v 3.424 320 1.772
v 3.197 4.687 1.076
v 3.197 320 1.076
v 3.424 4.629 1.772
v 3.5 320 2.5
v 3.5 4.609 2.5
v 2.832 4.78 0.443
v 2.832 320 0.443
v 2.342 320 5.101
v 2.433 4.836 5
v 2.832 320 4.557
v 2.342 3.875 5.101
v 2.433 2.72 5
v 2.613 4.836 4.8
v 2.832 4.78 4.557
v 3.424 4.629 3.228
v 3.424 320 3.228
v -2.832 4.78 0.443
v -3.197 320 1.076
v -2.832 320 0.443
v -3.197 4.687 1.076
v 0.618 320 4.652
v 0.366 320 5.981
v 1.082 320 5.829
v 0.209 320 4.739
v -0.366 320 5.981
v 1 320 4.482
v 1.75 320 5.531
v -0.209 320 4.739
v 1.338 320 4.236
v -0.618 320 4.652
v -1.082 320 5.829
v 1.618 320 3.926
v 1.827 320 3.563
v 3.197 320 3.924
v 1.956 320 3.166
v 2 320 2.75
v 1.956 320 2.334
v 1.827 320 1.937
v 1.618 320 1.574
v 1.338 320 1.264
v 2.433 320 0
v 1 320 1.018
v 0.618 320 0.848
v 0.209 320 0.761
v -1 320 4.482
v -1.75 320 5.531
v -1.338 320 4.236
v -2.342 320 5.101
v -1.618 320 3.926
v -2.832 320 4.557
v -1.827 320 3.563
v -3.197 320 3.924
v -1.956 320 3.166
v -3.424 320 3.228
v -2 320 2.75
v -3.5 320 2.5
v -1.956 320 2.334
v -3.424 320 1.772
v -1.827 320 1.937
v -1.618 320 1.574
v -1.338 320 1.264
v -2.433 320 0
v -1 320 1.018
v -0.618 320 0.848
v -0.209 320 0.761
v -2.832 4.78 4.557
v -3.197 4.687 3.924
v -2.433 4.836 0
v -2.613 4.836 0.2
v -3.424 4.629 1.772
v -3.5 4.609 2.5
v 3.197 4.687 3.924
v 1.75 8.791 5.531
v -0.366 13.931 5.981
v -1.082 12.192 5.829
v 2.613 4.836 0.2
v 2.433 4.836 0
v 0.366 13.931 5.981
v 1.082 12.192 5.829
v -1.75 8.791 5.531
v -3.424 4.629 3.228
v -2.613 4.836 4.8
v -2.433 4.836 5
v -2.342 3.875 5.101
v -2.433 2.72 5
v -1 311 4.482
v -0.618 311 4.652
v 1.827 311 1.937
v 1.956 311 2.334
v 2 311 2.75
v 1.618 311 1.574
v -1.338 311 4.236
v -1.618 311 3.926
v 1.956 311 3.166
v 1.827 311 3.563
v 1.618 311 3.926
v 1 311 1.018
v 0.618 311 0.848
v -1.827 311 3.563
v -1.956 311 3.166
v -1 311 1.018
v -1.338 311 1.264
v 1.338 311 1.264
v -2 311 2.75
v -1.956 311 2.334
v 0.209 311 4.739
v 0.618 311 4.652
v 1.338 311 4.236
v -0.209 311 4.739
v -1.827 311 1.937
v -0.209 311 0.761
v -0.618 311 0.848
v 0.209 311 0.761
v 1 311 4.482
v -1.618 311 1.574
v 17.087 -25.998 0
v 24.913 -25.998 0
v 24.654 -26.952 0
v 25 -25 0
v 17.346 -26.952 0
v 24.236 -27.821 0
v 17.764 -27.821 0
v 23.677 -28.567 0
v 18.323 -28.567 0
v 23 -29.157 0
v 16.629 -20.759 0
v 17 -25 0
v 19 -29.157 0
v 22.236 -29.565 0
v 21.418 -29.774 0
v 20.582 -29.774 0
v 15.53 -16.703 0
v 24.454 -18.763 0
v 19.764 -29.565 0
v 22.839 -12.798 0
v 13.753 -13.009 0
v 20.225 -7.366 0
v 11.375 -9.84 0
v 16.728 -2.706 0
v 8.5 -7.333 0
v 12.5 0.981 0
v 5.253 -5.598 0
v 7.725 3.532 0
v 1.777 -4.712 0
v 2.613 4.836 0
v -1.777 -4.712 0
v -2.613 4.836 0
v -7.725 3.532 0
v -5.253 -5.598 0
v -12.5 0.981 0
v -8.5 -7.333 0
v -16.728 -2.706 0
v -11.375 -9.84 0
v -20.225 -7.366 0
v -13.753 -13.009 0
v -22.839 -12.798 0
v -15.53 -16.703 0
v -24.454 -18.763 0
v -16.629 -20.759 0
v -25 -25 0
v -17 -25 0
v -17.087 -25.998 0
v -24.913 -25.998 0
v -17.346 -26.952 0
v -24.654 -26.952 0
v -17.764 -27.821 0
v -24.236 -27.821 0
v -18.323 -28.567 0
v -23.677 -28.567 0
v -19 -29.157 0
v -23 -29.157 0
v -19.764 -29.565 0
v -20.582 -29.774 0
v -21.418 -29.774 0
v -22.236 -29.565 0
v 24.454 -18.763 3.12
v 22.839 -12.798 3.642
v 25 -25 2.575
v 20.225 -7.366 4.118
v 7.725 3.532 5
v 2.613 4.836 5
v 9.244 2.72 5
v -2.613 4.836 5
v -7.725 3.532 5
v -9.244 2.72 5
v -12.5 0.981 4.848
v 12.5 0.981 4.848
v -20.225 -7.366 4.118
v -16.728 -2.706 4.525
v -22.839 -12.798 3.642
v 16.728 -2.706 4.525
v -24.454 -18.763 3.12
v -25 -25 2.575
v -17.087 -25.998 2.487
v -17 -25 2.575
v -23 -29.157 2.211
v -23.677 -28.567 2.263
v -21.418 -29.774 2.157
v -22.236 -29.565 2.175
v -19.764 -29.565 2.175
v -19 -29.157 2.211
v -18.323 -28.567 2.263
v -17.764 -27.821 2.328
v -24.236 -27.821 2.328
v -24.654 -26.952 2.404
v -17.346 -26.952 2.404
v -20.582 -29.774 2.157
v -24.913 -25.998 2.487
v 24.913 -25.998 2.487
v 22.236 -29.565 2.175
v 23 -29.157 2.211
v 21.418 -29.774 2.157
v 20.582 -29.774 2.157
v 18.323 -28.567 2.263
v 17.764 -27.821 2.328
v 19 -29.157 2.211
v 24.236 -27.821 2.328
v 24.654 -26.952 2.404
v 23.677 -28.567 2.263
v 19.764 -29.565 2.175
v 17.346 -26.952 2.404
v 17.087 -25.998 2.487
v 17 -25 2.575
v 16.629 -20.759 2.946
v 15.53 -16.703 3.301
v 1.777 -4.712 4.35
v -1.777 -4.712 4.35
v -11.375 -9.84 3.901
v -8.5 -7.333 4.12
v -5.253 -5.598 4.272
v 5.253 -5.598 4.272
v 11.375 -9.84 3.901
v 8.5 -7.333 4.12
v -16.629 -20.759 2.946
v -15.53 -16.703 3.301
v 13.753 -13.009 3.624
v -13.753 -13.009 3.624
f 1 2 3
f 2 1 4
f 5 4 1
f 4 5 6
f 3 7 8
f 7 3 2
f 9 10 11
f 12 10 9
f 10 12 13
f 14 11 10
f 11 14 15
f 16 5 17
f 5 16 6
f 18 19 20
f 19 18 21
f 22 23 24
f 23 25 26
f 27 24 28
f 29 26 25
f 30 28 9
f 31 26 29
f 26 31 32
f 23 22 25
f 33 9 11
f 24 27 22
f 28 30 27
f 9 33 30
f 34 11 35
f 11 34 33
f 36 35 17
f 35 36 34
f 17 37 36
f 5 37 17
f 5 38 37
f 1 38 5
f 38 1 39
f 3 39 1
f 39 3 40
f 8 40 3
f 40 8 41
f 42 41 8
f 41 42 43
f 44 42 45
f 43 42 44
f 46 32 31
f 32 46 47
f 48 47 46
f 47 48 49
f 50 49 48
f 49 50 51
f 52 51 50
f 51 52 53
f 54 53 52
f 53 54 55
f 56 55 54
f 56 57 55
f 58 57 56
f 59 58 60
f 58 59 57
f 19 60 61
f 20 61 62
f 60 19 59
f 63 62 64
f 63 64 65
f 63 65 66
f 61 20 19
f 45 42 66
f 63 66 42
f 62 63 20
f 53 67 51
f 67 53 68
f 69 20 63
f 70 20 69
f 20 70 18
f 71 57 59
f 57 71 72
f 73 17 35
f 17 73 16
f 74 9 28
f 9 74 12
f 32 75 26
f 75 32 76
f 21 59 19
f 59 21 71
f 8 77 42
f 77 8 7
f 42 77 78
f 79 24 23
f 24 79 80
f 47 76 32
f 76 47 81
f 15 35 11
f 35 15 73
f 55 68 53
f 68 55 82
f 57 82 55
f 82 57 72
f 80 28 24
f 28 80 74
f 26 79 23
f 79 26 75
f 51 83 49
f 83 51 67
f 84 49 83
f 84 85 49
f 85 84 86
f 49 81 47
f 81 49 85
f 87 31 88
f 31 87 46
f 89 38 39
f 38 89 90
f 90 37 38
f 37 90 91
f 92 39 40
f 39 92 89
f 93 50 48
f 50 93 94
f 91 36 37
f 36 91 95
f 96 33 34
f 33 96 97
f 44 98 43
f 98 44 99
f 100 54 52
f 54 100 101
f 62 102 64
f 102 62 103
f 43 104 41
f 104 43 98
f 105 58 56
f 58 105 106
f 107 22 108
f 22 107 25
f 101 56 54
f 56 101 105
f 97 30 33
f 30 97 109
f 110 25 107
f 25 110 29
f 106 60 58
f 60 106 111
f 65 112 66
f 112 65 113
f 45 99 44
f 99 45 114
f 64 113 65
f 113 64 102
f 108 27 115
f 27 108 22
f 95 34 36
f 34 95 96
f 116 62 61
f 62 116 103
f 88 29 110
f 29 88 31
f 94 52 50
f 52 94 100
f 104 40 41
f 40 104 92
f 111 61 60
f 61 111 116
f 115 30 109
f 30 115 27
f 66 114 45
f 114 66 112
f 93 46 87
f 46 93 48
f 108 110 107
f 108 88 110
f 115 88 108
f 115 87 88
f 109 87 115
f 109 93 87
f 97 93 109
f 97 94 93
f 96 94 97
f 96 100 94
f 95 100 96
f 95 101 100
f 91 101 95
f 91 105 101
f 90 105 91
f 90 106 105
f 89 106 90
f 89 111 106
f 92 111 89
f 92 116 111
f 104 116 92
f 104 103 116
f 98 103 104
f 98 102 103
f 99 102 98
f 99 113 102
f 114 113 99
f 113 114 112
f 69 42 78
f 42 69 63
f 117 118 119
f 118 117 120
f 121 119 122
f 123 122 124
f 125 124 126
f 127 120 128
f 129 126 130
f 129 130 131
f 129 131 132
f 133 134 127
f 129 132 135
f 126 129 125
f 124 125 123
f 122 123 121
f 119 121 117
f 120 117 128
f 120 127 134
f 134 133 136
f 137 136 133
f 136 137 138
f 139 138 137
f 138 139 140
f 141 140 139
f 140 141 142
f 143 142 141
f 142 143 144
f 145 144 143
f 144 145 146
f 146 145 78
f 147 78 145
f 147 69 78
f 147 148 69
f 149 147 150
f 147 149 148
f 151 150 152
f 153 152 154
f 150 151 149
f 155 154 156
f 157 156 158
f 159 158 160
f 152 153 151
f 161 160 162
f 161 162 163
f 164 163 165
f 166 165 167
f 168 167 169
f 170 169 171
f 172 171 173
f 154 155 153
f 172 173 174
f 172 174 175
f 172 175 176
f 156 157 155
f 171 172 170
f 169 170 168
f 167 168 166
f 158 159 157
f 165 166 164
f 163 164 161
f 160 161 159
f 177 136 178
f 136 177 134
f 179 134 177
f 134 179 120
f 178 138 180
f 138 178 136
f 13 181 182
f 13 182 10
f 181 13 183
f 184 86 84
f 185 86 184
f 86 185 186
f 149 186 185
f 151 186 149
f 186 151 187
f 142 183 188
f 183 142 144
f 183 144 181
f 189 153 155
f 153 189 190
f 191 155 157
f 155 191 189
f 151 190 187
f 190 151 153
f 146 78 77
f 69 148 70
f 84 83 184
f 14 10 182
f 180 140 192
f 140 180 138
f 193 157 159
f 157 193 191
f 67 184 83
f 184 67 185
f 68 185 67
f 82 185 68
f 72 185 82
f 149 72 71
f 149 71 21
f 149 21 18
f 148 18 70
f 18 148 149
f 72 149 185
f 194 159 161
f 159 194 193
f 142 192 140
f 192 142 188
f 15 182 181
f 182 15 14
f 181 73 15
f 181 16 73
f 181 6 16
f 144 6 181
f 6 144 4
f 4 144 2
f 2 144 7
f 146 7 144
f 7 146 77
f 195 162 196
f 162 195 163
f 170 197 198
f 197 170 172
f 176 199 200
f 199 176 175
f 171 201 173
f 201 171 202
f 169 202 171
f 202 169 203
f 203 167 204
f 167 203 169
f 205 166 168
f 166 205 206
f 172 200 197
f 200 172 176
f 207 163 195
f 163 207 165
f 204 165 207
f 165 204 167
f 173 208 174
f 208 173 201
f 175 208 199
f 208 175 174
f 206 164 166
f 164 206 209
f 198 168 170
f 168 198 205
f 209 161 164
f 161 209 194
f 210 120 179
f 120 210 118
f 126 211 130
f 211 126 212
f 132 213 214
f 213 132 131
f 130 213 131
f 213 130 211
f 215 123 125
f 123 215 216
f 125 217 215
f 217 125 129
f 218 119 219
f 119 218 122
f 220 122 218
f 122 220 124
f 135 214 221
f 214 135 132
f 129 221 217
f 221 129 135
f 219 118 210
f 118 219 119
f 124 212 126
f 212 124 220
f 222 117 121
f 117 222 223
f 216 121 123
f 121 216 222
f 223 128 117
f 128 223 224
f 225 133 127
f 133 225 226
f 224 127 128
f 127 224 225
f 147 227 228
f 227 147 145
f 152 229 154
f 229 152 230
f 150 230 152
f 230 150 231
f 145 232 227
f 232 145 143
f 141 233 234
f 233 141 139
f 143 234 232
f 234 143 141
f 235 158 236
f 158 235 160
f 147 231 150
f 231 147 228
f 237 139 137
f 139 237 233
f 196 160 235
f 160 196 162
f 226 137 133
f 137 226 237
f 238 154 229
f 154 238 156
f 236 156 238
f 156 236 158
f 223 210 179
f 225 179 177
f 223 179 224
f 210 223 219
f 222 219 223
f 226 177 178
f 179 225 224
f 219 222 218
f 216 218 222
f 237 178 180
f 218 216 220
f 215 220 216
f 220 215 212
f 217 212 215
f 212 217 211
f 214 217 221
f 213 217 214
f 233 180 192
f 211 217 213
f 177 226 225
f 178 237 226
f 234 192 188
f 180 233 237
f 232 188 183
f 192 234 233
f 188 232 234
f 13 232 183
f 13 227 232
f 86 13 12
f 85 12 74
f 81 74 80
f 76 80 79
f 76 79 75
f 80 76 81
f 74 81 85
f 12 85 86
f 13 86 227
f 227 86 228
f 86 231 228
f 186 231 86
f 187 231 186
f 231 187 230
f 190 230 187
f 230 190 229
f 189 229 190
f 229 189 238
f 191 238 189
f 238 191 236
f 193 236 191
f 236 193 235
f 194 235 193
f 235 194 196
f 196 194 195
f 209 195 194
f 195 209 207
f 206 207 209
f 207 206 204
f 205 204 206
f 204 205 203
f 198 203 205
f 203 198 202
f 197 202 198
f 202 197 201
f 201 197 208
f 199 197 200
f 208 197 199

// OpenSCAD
// Mouthstick Length
length = 320; // [10:350]
// Surface Smoothing
smooth = 30;  // [30:100]
// Bite Plate Size
bite_plate =50;	//	[25:small, 32:medium, 40:large, 50:supersized]


$fn = smooth;
difference()
{
union()
{
// stylus
rotate([-90,0,0]) 
{
difference()
{
translate([0,-2.5,0])
cylinder (length, 3.5, 3.5, false);

// hole in end for foam
translate([0,-2.75,length-9])
cylinder (h=9, r1=2, r2=2);


// flat bottom on stylus
translate([-3.5,0,0])
cube ([7, 7, length]);
}
}




// mouthpeice
translate([0,-bite_plate/2,0])
scale ([bite_plate/2,(bite_plate/2)*1.2,1])
{
difference()
{
union()
{
difference()
{
cylinder (h=5, r1=1, r2=1, center=false);
translate ([0,-1,2.5])
cube ([2,2,5], center=true);
}

//rounded bite plate ends
translate ([-.84,0,0])
cylinder (h=5,r1=.16,r2=.16, center=false);

translate ([.84,0,0])
cylinder (h=5,r1=.16,r2=.16, center=false);
}
// inner mouthpeice hole
cylinder (h=5,r1=.68, r2=.68);
}
}
}
translate ([-bite_plate/2,-bite_plate+7, 1])
rotate ([5,0,0])
cube ([bite_plate, bite_plate*2, 30]);
}
